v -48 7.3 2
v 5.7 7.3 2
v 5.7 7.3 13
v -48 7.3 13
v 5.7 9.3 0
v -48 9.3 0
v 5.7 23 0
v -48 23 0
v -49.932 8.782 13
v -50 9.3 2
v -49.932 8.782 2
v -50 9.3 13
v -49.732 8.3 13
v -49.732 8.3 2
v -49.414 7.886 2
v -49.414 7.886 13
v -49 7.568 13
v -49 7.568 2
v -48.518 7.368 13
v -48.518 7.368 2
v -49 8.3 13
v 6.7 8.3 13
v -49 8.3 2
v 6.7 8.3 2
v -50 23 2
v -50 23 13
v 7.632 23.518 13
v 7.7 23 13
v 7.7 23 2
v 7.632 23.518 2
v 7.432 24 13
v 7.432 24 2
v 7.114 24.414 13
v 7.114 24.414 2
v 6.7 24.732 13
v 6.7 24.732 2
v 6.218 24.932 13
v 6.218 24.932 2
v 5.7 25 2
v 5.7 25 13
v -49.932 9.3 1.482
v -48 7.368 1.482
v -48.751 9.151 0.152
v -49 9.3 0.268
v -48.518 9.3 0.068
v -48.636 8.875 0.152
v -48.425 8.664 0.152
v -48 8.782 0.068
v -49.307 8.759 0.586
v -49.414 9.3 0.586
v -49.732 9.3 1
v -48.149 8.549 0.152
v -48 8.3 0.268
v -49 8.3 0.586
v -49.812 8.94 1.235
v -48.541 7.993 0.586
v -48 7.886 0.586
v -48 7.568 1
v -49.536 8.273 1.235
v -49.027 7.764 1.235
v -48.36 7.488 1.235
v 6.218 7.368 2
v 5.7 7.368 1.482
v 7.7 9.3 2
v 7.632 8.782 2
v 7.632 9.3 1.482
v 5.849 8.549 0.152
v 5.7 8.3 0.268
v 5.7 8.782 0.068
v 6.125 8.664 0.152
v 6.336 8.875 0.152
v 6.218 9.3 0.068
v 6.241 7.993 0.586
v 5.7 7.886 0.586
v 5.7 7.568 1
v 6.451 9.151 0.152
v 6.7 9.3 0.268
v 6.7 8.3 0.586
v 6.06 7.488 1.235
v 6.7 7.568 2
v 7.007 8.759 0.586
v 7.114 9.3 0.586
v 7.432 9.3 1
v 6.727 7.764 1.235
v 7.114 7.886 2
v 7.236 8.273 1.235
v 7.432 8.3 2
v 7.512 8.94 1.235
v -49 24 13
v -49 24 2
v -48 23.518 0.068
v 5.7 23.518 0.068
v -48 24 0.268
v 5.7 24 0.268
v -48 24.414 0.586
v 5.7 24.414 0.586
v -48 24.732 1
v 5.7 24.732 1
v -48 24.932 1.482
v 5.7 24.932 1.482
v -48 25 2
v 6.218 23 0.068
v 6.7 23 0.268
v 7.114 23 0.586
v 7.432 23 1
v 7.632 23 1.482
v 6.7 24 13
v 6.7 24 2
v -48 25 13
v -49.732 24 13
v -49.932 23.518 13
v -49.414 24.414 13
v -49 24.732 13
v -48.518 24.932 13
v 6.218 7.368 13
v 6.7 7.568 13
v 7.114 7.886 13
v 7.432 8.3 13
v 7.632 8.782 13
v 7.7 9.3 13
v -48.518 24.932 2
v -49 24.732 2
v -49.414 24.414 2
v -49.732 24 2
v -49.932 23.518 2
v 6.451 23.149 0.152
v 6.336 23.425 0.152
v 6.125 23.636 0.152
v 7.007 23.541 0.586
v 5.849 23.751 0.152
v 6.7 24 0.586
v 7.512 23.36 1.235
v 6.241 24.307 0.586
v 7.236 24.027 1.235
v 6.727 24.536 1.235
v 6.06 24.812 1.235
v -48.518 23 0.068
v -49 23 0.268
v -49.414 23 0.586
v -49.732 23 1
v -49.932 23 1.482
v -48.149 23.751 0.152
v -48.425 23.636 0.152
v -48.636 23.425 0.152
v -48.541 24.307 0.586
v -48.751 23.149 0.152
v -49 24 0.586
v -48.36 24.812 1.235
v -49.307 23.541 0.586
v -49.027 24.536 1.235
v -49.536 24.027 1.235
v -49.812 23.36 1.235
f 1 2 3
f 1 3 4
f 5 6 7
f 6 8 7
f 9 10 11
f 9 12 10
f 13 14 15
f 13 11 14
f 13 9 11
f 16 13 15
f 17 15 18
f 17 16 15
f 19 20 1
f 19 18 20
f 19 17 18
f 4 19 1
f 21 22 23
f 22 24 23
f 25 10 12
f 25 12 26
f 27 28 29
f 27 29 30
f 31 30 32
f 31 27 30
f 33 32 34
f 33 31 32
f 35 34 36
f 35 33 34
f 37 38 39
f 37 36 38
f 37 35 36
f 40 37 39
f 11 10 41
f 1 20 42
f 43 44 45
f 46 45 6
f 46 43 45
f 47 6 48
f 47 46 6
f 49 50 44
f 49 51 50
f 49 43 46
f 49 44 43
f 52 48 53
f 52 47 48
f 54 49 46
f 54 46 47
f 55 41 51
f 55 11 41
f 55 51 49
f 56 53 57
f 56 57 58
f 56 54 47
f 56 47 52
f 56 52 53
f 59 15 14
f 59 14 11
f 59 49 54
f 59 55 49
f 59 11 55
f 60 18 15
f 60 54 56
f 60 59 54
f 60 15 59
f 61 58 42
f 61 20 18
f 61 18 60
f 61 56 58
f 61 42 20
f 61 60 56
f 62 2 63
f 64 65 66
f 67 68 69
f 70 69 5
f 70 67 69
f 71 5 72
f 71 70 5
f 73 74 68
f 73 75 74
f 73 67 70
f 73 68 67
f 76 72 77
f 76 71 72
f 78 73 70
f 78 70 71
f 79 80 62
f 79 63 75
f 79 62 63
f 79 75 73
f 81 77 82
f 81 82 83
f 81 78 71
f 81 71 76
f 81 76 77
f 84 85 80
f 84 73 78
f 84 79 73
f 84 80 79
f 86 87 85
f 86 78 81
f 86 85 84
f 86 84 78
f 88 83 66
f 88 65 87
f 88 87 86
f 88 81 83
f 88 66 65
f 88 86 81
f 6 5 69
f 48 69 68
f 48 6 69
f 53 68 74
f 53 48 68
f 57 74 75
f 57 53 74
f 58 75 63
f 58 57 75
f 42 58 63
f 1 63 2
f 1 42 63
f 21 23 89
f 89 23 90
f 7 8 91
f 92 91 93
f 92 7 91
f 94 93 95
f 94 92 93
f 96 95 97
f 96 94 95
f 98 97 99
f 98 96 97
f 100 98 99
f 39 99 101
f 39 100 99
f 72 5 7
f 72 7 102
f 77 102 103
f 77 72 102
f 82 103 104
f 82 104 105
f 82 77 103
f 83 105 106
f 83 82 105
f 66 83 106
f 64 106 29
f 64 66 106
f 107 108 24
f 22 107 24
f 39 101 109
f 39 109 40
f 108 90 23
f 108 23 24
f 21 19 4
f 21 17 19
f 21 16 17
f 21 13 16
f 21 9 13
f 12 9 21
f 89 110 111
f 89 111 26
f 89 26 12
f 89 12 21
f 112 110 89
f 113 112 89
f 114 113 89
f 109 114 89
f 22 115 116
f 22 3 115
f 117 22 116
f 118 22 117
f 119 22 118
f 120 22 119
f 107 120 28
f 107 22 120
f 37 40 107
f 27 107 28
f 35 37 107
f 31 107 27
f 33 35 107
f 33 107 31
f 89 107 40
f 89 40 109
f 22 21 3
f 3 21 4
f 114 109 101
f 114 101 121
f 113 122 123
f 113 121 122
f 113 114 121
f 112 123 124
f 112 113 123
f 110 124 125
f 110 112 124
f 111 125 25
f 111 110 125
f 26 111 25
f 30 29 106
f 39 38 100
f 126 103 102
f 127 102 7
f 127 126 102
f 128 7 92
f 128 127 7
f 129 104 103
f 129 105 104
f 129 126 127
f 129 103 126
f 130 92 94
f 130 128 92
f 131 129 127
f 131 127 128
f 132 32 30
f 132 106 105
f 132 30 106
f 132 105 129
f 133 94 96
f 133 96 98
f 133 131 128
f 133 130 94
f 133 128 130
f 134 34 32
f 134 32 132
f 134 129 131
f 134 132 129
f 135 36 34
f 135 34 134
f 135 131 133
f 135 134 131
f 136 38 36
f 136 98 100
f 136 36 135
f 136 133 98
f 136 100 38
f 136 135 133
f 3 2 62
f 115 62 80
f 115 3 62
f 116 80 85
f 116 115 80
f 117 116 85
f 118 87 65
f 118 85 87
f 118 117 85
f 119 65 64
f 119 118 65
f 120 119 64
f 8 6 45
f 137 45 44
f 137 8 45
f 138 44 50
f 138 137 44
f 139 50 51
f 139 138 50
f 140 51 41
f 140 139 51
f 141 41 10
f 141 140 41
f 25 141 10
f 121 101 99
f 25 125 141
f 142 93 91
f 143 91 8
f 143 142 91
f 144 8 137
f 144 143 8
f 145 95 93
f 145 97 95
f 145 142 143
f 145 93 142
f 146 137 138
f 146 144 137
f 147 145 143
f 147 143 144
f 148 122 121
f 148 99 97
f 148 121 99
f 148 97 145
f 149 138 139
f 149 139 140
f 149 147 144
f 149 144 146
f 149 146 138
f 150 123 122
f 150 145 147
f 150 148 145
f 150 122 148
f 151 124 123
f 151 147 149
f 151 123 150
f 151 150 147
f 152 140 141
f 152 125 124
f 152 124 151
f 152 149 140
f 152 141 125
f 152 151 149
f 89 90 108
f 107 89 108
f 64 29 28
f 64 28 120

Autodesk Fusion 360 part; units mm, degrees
sketch "Sketch1" plane through (0, 0, 0) normal (0, 0, 1) x (1, 0, 0)
  line L0 (-50, 25) -> (7.7, 25)
  line L1 (7.7, 25) -> (7.7, 7.3)
  line L2 (7.7, 7.3) -> (-50, 7.3)
  line L3 (-50, 7.3) -> (-50, 25)
  line L4 (6.7, 8.3) -> (-49, 8.3)
  line L5 (-49, 8.3) -> (-49, 24)
  line L6 (-49, 24) -> (6.7, 24)
  line L7 (6.7, 24) -> (6.7, 8.3)
  line L8 (6.7, 8.3) -> (-49, 24) construction
  line L9 (-49, 8.3) -> (6.7, 24) construction
  point P0 (-21.15, 16.15)
  dimension "d1" = 57.7
  dimension "d2" = 17.7
  dimension "d3" = 55.7
  dimension "d4" = 15.7
extrude "Extrude1" add sketch "Sketch1" along normal blind 2 contours L4 L5 L6 L7
extrude "Extrude2" add sketch "Sketch1" along normal blind 13
fillet "Fillet1" radius 2 4 edges at (7.7, 7.3, 6.5) (7.7, 25, 6.5) (-50, 7.3, 6.5) (-50, 25, 6.5)
fillet "Fillet2" radius 2 8 edges at (7.1142, 7.8858, 0) (-21.15, 7.3, 0) (-49.4142, 7.8858, 0) (-50, 16.15, 0) (-49.4142, 24.4142, 0) (-21.15, 25, 0) (7.1142, 24.4142, 0) (7.7, 16.15, 0)
